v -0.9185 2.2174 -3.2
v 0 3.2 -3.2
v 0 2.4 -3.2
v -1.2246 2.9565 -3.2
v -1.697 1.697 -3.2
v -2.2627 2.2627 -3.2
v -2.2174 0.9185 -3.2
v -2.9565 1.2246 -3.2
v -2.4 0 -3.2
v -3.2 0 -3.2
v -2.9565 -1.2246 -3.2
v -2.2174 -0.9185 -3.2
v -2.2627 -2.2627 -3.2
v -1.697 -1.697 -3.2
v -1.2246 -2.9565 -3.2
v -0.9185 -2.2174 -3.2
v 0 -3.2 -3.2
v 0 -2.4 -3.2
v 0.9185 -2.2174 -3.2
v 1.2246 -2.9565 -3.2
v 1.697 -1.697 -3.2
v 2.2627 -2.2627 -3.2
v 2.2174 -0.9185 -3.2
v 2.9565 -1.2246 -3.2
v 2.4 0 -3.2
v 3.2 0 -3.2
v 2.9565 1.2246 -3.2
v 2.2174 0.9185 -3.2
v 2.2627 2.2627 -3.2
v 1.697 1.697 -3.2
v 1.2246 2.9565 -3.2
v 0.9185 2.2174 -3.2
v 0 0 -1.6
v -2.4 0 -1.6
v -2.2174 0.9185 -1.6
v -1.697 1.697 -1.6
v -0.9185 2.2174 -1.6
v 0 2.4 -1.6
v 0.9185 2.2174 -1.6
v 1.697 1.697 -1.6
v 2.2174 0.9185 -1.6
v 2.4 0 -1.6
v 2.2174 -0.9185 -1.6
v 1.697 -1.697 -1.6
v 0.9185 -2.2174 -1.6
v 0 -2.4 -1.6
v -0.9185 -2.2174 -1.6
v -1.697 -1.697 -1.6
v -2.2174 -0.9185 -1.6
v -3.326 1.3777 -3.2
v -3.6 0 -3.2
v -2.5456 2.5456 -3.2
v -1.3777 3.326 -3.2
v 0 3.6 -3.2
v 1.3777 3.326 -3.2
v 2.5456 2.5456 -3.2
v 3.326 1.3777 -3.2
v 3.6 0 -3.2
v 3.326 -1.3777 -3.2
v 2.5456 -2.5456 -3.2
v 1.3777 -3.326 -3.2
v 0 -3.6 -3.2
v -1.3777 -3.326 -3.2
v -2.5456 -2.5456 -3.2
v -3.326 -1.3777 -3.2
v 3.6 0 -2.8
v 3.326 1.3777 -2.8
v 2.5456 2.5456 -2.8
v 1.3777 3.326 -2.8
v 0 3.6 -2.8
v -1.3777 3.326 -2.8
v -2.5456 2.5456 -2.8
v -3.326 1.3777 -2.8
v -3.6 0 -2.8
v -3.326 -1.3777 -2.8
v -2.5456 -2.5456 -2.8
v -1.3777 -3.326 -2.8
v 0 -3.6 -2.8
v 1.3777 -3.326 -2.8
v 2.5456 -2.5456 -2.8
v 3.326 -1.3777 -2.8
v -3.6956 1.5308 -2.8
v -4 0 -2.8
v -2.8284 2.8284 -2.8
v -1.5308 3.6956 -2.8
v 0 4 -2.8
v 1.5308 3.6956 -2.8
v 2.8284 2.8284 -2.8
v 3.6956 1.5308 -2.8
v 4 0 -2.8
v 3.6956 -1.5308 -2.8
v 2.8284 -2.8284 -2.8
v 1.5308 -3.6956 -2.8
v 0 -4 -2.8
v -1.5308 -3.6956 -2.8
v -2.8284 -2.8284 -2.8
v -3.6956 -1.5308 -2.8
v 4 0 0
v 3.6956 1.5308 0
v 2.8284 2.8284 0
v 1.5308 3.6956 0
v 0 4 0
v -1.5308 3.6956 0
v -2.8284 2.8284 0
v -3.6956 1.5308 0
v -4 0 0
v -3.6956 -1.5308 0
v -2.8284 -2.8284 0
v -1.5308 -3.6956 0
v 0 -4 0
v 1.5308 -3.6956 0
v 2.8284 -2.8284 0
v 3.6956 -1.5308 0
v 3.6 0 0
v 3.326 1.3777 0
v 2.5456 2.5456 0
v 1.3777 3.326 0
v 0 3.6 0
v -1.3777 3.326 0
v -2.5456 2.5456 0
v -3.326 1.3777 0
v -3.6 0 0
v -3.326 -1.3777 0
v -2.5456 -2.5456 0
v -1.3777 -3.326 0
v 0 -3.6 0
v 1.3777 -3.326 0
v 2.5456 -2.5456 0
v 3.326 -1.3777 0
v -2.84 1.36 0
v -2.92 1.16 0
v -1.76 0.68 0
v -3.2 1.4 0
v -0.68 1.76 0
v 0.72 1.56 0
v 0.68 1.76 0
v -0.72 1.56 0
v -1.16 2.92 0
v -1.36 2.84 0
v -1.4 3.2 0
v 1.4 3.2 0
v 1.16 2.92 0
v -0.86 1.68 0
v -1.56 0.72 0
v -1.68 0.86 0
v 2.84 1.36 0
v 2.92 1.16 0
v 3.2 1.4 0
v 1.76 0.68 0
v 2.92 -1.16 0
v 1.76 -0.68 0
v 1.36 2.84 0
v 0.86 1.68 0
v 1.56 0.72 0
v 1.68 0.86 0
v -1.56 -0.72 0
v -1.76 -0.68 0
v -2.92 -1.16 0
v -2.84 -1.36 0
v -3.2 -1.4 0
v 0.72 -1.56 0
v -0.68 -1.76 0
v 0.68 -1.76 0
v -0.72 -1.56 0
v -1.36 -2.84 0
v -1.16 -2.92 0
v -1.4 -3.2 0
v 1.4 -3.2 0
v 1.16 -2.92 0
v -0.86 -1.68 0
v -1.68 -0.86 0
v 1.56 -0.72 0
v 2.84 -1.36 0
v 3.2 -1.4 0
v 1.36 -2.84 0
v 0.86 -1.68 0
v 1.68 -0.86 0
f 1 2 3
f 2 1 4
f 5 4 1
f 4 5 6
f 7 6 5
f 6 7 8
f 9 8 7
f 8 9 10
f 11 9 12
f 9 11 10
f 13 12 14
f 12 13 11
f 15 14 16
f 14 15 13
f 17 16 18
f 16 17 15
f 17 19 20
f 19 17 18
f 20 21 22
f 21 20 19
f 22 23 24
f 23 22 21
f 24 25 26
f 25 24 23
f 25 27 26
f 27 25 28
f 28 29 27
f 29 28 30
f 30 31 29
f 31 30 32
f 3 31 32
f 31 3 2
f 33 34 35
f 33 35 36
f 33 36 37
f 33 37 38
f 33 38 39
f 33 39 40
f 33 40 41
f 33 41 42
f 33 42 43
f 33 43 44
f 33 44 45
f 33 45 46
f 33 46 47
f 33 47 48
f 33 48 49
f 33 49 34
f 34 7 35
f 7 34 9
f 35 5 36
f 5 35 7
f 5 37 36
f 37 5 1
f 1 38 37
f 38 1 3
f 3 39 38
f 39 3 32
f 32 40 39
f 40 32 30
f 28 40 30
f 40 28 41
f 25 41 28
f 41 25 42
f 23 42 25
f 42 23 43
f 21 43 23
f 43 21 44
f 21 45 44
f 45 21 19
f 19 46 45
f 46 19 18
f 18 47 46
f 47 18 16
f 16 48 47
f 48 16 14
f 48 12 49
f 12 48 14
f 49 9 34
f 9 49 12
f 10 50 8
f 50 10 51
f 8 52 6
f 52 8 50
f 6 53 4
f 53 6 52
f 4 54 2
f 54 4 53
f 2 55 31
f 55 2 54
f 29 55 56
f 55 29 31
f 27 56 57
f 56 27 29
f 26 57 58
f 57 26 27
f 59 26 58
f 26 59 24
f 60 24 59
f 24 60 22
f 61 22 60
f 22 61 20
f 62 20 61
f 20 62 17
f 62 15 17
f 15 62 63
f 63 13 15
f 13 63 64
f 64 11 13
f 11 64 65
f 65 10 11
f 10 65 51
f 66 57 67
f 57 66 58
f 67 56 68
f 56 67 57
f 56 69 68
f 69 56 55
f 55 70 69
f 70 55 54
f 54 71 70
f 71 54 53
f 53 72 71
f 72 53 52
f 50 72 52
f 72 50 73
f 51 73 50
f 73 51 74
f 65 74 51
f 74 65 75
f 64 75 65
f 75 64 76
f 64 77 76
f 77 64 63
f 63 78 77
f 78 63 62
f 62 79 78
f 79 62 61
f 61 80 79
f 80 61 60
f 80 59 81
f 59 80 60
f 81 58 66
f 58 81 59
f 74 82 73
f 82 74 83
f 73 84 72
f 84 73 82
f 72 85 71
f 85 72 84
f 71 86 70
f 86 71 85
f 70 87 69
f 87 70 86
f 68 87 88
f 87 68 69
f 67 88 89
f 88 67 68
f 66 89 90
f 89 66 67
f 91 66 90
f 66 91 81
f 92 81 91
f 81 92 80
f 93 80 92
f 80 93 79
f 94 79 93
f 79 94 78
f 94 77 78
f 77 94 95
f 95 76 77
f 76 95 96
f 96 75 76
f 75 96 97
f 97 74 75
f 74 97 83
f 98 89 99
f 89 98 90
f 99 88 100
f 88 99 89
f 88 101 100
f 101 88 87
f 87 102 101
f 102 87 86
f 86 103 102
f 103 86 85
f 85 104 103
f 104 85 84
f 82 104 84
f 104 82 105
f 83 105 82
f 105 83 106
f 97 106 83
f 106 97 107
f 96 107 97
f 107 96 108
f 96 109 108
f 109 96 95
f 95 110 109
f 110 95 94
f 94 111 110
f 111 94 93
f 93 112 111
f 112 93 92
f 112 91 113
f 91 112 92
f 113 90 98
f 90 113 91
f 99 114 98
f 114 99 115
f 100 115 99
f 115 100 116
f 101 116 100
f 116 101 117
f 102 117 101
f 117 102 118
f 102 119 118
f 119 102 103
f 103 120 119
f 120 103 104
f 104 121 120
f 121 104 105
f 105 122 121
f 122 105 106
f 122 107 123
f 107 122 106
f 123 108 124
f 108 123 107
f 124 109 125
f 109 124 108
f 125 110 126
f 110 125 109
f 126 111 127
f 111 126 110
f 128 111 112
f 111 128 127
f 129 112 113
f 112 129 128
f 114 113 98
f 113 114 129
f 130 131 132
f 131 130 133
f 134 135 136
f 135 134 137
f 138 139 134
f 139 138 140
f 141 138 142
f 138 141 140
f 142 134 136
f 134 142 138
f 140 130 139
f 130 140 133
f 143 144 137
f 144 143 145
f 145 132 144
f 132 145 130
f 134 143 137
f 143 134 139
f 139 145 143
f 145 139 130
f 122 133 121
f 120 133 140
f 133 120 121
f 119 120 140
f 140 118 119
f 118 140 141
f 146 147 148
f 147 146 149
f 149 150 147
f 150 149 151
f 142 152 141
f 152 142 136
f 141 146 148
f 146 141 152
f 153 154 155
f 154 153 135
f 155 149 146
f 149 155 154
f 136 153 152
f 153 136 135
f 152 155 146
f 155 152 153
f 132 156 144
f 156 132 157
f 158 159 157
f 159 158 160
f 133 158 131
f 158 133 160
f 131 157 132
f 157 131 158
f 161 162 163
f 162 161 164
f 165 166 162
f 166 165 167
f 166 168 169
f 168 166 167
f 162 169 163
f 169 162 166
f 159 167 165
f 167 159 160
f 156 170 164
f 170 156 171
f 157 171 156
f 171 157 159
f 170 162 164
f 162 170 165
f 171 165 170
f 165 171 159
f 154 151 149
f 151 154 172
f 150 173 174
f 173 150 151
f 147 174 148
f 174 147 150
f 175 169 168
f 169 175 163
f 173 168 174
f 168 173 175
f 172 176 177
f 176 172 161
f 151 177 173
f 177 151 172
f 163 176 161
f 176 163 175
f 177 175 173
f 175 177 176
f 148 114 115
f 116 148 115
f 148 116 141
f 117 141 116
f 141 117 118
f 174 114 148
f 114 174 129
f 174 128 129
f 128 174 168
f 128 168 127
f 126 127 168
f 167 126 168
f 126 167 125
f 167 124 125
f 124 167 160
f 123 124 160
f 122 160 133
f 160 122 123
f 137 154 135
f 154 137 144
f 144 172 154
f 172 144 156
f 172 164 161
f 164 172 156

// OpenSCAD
use <../lib.scad>
use <../p/4-4ering.scad>
use <s/98138s01.scad>
$fa=1; $fs=0.2;
function ldraw_lib__98138pm5(realsolid=false) = [
// 0 Tile  1 x  1 Round with Octagon (Arkenstone) Pattern
// 0 Name: 98138pm5.dat
// 0 Author: Gerald Lasser [GeraldLasser]
// 0 !LDRAW_ORG Part UPDATE 2018-01
// 0 !LICENSE Licensed under CC BY 2.0 and CC BY 4.0 : see CAreadme.txt
// 
// 0 BFC CERTIFY CCW
  [0,"BFC","CERTIFY"],
  [0,"BFC","CCW"],
// 
// 0 !KEYWORDS BrickLink 98138pb024, Hobbit, Set 79018
// 
// 0 !CMDLINE -c47
// 
// 0 !HISTORY 2017-12-30 [PTadmin] Official Update 2017-01
// 0 !HISTORY 2018-01-02 [MagFors] Corrected "bfc noclip"
// 0 !HISTORY 2018-01-30 [PTadmin] Official Update 2018-01
// 
// 
// 1 16 0 0 0 1 0 0 0 1 0 0 0 1 s\98138s01.dat
  [1,16,0,0,0,1,0,0,0,1,0,0,0,1, ldraw_lib__s__98138s01(realsolid)],
// 1 16 0 0 0 9 0 0 0 1 0 0 0 9 4-4ering.dat
  [1,16,0,0,0,9,0,0,0,1,0,0,0,9, ldraw_lib__4_4ering(realsolid)],
// 0 BFC NOCLIP
  [0,"BFC","NOCLIP"],
// 4 80 -8 0 3.5 -7.3 0 2.9 -4.4 0 1.7 -7.1 0 3.4
  [4,80,-8,0,3.5,-7.3,0,2.9,-4.4,0,1.7,-7.1,0,3.4],
// 4 80 1.8 0 3.9 1.7 0 4.4 -1.7 0 4.4 -1.8 0 3.9
  [4,80,1.8,0,3.9,1.7,0,4.4,-1.7,0,4.4,-1.8,0,3.9],
// 4 80 -1.7 0 4.4 -2.9 0 7.3 -3.5 0 8 -3.4 0 7.1
  [4,80,-1.7,0,4.4,-2.9,0,7.3,-3.5,0,8,-3.4,0,7.1],
// 4 80 3.5 0 8 -3.5 0 8 -2.9 0 7.3 2.9 0 7.3
  [4,80,3.5,0,8,-3.5,0,8,-2.9,0,7.3,2.9,0,7.3],
// 4 16 2.9 0 7.3 -2.9 0 7.3 -1.7 0 4.4 1.7 0 4.4
  [4,16,2.9,0,7.3,-2.9,0,7.3,-1.7,0,4.4,1.7,0,4.4],
// 4 80 -3.5 0 8 -8 0 3.5 -7.1 0 3.4 -3.4 0 7.1
  [4,80,-3.5,0,8,-8,0,3.5,-7.1,0,3.4,-3.4,0,7.1],
// 4 80 -3.9 0 1.8 -1.8 0 3.9 -2.15 0 4.2 -4.2 0 2.15
  [4,80,-3.9,0,1.8,-1.8,0,3.9,-2.15,0,4.2,-4.2,0,2.15],
// 4 80 -4.2 0 2.15 -7.1 0 3.4 -4.4 0 1.7 -3.9 0 1.8
  [4,80,-4.2,0,2.15,-7.1,0,3.4,-4.4,0,1.7,-3.9,0,1.8],
// 4 80 -2.15 0 4.2 -1.8 0 3.9 -1.7 0 4.4 -3.4 0 7.1
  [4,80,-2.15,0,4.2,-1.8,0,3.9,-1.7,0,4.4,-3.4,0,7.1],
// 4 16 -2.15 0 4.2 -3.4 0 7.1 -7.1 0 3.4 -4.2 0 2.15
  [4,16,-2.15,0,4.2,-3.4,0,7.1,-7.1,0,3.4,-4.2,0,2.15],
// 3 16 -9 0 0 -8 0 3.5 -8.3151 0 3.4443
  [3,16,-9,0,0,-8,0,3.5,-8.3151,0,3.4443],
// 4 16 -6.3639 0 6.3639 -8.3151 0 3.4443 -8 0 3.5 -3.5 0 8
  [4,16,-6.3639,0,6.3639,-8.3151,0,3.4443,-8,0,3.5,-3.5,0,8],
// 3 16 -3.4443 0 8.3151 -6.3639 0 6.3639 -3.5 0 8
  [3,16,-3.4443,0,8.3151,-6.3639,0,6.3639,-3.5,0,8],
// 4 16 0 0 9 -3.4443 0 8.3151 -3.5 0 8 3.5 0 8
  [4,16,0,0,9,-3.4443,0,8.3151,-3.5,0,8,3.5,0,8],
// 4 80 4.4 0 1.7 7.3 0 2.9 8 0 3.5 7.1 0 3.4
  [4,80,4.4,0,1.7,7.3,0,2.9,8,0,3.5,7.1,0,3.4],
// 4 16 7.3 0 -2.9 7.3 0 2.9 4.4 0 1.7 4.4 0 -1.7
  [4,16,7.3,0,-2.9,7.3,0,2.9,4.4,0,1.7,4.4,0,-1.7],
// 4 80 3.5 0 8 2.9 0 7.3 1.7 0 4.4 3.4 0 7.1
  [4,80,3.5,0,8,2.9,0,7.3,1.7,0,4.4,3.4,0,7.1],
// 4 80 7.1 0 3.4 8 0 3.5 3.5 0 8 3.4 0 7.1
  [4,80,7.1,0,3.4,8,0,3.5,3.5,0,8,3.4,0,7.1],
// 4 80 2.15 0 4.2 1.8 0 3.9 3.9 0 1.8 4.2 0 2.15
  [4,80,2.15,0,4.2,1.8,0,3.9,3.9,0,1.8,4.2,0,2.15],
// 4 80 4.4 0 1.7 7.1 0 3.4 4.2 0 2.15 3.9 0 1.8
  [4,80,4.4,0,1.7,7.1,0,3.4,4.2,0,2.15,3.9,0,1.8],
// 4 80 1.7 0 4.4 1.8 0 3.9 2.15 0 4.2 3.4 0 7.1
  [4,80,1.7,0,4.4,1.8,0,3.9,2.15,0,4.2,3.4,0,7.1],
// 4 16 7.1 0 3.4 3.4 0 7.1 2.15 0 4.2 4.2 0 2.15
  [4,16,7.1,0,3.4,3.4,0,7.1,2.15,0,4.2,4.2,0,2.15],
// 4 80 -3.9 0 1.8 -4.4 0 1.7 -4.4 0 -1.7 -3.9 0 -1.8
  [4,80,-3.9,0,1.8,-4.4,0,1.7,-4.4,0,-1.7,-3.9,0,-1.8],
// 4 80 -4.4 0 -1.7 -7.3 0 -2.9 -8 0 -3.5 -7.1 0 -3.4
  [4,80,-4.4,0,-1.7,-7.3,0,-2.9,-8,0,-3.5,-7.1,0,-3.4],
// 4 80 -8 0 3.5 -8 0 -3.5 -7.3 0 -2.9 -7.3 0 2.9
  [4,80,-8,0,3.5,-8,0,-3.5,-7.3,0,-2.9,-7.3,0,2.9],
// 4 16 -7.3 0 2.9 -7.3 0 -2.9 -4.4 0 -1.7 -4.4 0 1.7
  [4,16,-7.3,0,2.9,-7.3,0,-2.9,-4.4,0,-1.7,-4.4,0,1.7],
// 4 80 -1.7 0 -4.4 1.7 0 -4.4 1.8 0 -3.9 -1.8 0 -3.9
  [4,80,-1.7,0,-4.4,1.7,0,-4.4,1.8,0,-3.9,-1.8,0,-3.9],
// 4 80 -3.5 0 -8 -2.9 0 -7.3 -1.7 0 -4.4 -3.4 0 -7.1
  [4,80,-3.5,0,-8,-2.9,0,-7.3,-1.7,0,-4.4,-3.4,0,-7.1],
// 4 80 -2.9 0 -7.3 -3.5 0 -8 3.5 0 -8 2.9 0 -7.3
  [4,80,-2.9,0,-7.3,-3.5,0,-8,3.5,0,-8,2.9,0,-7.3],
// 4 16 -1.7 0 -4.4 -2.9 0 -7.3 2.9 0 -7.3 1.7 0 -4.4
  [4,16,-1.7,0,-4.4,-2.9,0,-7.3,2.9,0,-7.3,1.7,0,-4.4],
// 4 80 -7.1 0 -3.4 -8 0 -3.5 -3.5 0 -8 -3.4 0 -7.1
  [4,80,-7.1,0,-3.4,-8,0,-3.5,-3.5,0,-8,-3.4,0,-7.1],
// 4 80 -2.15 0 -4.2 -1.8 0 -3.9 -3.9 0 -1.8 -4.2 0 -2.15
  [4,80,-2.15,0,-4.2,-1.8,0,-3.9,-3.9,0,-1.8,-4.2,0,-2.15],
// 4 80 -4.4 0 -1.7 -7.1 0 -3.4 -4.2 0 -2.15 -3.9 0 -1.8
  [4,80,-4.4,0,-1.7,-7.1,0,-3.4,-4.2,0,-2.15,-3.9,0,-1.8],
// 4 80 -1.7 0 -4.4 -1.8 0 -3.9 -2.15 0 -4.2 -3.4 0 -7.1
  [4,80,-1.7,0,-4.4,-1.8,0,-3.9,-2.15,0,-4.2,-3.4,0,-7.1],
// 4 16 -7.1 0 -3.4 -3.4 0 -7.1 -2.15 0 -4.2 -4.2 0 -2.15
  [4,16,-7.1,0,-3.4,-3.4,0,-7.1,-2.15,0,-4.2,-4.2,0,-2.15],
// 4 80 4.4 0 1.7 3.9 0 1.8 3.9 0 -1.8 4.4 0 -1.7
  [4,80,4.4,0,1.7,3.9,0,1.8,3.9,0,-1.8,4.4,0,-1.7],
// 4 80 8 0 -3.5 7.3 0 -2.9 4.4 0 -1.7 7.1 0 -3.4
  [4,80,8,0,-3.5,7.3,0,-2.9,4.4,0,-1.7,7.1,0,-3.4],
// 4 80 7.3 0 2.9 7.3 0 -2.9 8 0 -3.5 8 0 3.5
  [4,80,7.3,0,2.9,7.3,0,-2.9,8,0,-3.5,8,0,3.5],
// 4 80 1.7 0 -4.4 2.9 0 -7.3 3.5 0 -8 3.4 0 -7.1
  [4,80,1.7,0,-4.4,2.9,0,-7.3,3.5,0,-8,3.4,0,-7.1],
// 4 80 3.5 0 -8 8 0 -3.5 7.1 0 -3.4 3.4 0 -7.1
  [4,80,3.5,0,-8,8,0,-3.5,7.1,0,-3.4,3.4,0,-7.1],
// 4 80 3.9 0 -1.8 1.8 0 -3.9 2.15 0 -4.2 4.2 0 -2.15
  [4,80,3.9,0,-1.8,1.8,0,-3.9,2.15,0,-4.2,4.2,0,-2.15],
// 4 80 4.2 0 -2.15 7.1 0 -3.4 4.4 0 -1.7 3.9 0 -1.8
  [4,80,4.2,0,-2.15,7.1,0,-3.4,4.4,0,-1.7,3.9,0,-1.8],
// 4 80 2.15 0 -4.2 1.8 0 -3.9 1.7 0 -4.4 3.4 0 -7.1
  [4,80,2.15,0,-4.2,1.8,0,-3.9,1.7,0,-4.4,3.4,0,-7.1],
// 4 16 2.15 0 -4.2 3.4 0 -7.1 7.1 0 -3.4 4.2 0 -2.15
  [4,16,2.15,0,-4.2,3.4,0,-7.1,7.1,0,-3.4,4.2,0,-2.15],
// 3 16 8 0 3.5 9 0 0 8.3151 0 3.4443
  [3,16,8,0,3.5,9,0,0,8.3151,0,3.4443],
// 4 16 6.3639 0 6.3639 3.5 0 8 8 0 3.5 8.3151 0 3.4443
  [4,16,6.3639,0,6.3639,3.5,0,8,8,0,3.5,8.3151,0,3.4443],
// 3 16 3.4443 0 8.3151 3.5 0 8 6.3639 0 6.3639
  [3,16,3.4443,0,8.3151,3.5,0,8,6.3639,0,6.3639],
// 3 16 3.5 0 8 3.4443 0 8.3151 0 0 9
  [3,16,3.5,0,8,3.4443,0,8.3151,0,0,9],
// 4 16 9 0 0 8 0 3.5 8 0 -3.5 8.3151 0 -3.4443
  [4,16,9,0,0,8,0,3.5,8,0,-3.5,8.3151,0,-3.4443],
// 4 16 6.3639 0 -6.3639 8.3151 0 -3.4443 8 0 -3.5 3.5 0 -8
  [4,16,6.3639,0,-6.3639,8.3151,0,-3.4443,8,0,-3.5,3.5,0,-8],
// 3 16 6.3639 0 -6.3639 3.5 0 -8 3.4443 0 -8.3151
  [3,16,6.3639,0,-6.3639,3.5,0,-8,3.4443,0,-8.3151],
// 3 16 0 0 -9 3.4443 0 -8.3151 3.5 0 -8
  [3,16,0,0,-9,3.4443,0,-8.3151,3.5,0,-8],
// 4 16 0 0 -9 3.5 0 -8 -3.5 0 -8 -3.4443 0 -8.3151
  [4,16,0,0,-9,3.5,0,-8,-3.5,0,-8,-3.4443,0,-8.3151],
// 4 16 -6.3639 0 -6.3639 -3.4443 0 -8.3151 -3.5 0 -8 -8 0 -3.5
  [4,16,-6.3639,0,-6.3639,-3.4443,0,-8.3151,-3.5,0,-8,-8,0,-3.5],
// 3 16 -8.3151 0 -3.4443 -6.3639 0 -6.3639 -8 0 -3.5
  [3,16,-8.3151,0,-3.4443,-6.3639,0,-6.3639,-8,0,-3.5],
// 4 16 -9 0 0 -8.3151 0 -3.4443 -8 0 -3.5 -8 0 3.5
  [4,16,-9,0,0,-8.3151,0,-3.4443,-8,0,-3.5,-8,0,3.5],
// 4 16 1.8 0 3.9 -1.8 0 3.9 -3.9 0 1.8 3.9 0 1.8
  [4,16,1.8,0,3.9,-1.8,0,3.9,-3.9,0,1.8,3.9,0,1.8],
// 4 16 3.9 0 -1.8 3.9 0 1.8 -3.9 0 1.8 -3.9 0 -1.8
  [4,16,3.9,0,-1.8,3.9,0,1.8,-3.9,0,1.8,-3.9,0,-1.8],
// 4 16 1.8 0 -3.9 3.9 0 -1.8 -3.9 0 -1.8 -1.8 0 -3.9
  [4,16,1.8,0,-3.9,3.9,0,-1.8,-3.9,0,-1.8,-1.8,0,-3.9],
];
module ldraw_lib__98138pm5(step=0, col=false, unit=2/5, alt=false, line=0.2, solid=!$preview)
    makepoly(ldraw_lib__98138pm5(solid), step=step, col=col, unit=unit, alt=alt, line=line, solid=solid);
ldraw_lib__98138pm5(line=0.2);
